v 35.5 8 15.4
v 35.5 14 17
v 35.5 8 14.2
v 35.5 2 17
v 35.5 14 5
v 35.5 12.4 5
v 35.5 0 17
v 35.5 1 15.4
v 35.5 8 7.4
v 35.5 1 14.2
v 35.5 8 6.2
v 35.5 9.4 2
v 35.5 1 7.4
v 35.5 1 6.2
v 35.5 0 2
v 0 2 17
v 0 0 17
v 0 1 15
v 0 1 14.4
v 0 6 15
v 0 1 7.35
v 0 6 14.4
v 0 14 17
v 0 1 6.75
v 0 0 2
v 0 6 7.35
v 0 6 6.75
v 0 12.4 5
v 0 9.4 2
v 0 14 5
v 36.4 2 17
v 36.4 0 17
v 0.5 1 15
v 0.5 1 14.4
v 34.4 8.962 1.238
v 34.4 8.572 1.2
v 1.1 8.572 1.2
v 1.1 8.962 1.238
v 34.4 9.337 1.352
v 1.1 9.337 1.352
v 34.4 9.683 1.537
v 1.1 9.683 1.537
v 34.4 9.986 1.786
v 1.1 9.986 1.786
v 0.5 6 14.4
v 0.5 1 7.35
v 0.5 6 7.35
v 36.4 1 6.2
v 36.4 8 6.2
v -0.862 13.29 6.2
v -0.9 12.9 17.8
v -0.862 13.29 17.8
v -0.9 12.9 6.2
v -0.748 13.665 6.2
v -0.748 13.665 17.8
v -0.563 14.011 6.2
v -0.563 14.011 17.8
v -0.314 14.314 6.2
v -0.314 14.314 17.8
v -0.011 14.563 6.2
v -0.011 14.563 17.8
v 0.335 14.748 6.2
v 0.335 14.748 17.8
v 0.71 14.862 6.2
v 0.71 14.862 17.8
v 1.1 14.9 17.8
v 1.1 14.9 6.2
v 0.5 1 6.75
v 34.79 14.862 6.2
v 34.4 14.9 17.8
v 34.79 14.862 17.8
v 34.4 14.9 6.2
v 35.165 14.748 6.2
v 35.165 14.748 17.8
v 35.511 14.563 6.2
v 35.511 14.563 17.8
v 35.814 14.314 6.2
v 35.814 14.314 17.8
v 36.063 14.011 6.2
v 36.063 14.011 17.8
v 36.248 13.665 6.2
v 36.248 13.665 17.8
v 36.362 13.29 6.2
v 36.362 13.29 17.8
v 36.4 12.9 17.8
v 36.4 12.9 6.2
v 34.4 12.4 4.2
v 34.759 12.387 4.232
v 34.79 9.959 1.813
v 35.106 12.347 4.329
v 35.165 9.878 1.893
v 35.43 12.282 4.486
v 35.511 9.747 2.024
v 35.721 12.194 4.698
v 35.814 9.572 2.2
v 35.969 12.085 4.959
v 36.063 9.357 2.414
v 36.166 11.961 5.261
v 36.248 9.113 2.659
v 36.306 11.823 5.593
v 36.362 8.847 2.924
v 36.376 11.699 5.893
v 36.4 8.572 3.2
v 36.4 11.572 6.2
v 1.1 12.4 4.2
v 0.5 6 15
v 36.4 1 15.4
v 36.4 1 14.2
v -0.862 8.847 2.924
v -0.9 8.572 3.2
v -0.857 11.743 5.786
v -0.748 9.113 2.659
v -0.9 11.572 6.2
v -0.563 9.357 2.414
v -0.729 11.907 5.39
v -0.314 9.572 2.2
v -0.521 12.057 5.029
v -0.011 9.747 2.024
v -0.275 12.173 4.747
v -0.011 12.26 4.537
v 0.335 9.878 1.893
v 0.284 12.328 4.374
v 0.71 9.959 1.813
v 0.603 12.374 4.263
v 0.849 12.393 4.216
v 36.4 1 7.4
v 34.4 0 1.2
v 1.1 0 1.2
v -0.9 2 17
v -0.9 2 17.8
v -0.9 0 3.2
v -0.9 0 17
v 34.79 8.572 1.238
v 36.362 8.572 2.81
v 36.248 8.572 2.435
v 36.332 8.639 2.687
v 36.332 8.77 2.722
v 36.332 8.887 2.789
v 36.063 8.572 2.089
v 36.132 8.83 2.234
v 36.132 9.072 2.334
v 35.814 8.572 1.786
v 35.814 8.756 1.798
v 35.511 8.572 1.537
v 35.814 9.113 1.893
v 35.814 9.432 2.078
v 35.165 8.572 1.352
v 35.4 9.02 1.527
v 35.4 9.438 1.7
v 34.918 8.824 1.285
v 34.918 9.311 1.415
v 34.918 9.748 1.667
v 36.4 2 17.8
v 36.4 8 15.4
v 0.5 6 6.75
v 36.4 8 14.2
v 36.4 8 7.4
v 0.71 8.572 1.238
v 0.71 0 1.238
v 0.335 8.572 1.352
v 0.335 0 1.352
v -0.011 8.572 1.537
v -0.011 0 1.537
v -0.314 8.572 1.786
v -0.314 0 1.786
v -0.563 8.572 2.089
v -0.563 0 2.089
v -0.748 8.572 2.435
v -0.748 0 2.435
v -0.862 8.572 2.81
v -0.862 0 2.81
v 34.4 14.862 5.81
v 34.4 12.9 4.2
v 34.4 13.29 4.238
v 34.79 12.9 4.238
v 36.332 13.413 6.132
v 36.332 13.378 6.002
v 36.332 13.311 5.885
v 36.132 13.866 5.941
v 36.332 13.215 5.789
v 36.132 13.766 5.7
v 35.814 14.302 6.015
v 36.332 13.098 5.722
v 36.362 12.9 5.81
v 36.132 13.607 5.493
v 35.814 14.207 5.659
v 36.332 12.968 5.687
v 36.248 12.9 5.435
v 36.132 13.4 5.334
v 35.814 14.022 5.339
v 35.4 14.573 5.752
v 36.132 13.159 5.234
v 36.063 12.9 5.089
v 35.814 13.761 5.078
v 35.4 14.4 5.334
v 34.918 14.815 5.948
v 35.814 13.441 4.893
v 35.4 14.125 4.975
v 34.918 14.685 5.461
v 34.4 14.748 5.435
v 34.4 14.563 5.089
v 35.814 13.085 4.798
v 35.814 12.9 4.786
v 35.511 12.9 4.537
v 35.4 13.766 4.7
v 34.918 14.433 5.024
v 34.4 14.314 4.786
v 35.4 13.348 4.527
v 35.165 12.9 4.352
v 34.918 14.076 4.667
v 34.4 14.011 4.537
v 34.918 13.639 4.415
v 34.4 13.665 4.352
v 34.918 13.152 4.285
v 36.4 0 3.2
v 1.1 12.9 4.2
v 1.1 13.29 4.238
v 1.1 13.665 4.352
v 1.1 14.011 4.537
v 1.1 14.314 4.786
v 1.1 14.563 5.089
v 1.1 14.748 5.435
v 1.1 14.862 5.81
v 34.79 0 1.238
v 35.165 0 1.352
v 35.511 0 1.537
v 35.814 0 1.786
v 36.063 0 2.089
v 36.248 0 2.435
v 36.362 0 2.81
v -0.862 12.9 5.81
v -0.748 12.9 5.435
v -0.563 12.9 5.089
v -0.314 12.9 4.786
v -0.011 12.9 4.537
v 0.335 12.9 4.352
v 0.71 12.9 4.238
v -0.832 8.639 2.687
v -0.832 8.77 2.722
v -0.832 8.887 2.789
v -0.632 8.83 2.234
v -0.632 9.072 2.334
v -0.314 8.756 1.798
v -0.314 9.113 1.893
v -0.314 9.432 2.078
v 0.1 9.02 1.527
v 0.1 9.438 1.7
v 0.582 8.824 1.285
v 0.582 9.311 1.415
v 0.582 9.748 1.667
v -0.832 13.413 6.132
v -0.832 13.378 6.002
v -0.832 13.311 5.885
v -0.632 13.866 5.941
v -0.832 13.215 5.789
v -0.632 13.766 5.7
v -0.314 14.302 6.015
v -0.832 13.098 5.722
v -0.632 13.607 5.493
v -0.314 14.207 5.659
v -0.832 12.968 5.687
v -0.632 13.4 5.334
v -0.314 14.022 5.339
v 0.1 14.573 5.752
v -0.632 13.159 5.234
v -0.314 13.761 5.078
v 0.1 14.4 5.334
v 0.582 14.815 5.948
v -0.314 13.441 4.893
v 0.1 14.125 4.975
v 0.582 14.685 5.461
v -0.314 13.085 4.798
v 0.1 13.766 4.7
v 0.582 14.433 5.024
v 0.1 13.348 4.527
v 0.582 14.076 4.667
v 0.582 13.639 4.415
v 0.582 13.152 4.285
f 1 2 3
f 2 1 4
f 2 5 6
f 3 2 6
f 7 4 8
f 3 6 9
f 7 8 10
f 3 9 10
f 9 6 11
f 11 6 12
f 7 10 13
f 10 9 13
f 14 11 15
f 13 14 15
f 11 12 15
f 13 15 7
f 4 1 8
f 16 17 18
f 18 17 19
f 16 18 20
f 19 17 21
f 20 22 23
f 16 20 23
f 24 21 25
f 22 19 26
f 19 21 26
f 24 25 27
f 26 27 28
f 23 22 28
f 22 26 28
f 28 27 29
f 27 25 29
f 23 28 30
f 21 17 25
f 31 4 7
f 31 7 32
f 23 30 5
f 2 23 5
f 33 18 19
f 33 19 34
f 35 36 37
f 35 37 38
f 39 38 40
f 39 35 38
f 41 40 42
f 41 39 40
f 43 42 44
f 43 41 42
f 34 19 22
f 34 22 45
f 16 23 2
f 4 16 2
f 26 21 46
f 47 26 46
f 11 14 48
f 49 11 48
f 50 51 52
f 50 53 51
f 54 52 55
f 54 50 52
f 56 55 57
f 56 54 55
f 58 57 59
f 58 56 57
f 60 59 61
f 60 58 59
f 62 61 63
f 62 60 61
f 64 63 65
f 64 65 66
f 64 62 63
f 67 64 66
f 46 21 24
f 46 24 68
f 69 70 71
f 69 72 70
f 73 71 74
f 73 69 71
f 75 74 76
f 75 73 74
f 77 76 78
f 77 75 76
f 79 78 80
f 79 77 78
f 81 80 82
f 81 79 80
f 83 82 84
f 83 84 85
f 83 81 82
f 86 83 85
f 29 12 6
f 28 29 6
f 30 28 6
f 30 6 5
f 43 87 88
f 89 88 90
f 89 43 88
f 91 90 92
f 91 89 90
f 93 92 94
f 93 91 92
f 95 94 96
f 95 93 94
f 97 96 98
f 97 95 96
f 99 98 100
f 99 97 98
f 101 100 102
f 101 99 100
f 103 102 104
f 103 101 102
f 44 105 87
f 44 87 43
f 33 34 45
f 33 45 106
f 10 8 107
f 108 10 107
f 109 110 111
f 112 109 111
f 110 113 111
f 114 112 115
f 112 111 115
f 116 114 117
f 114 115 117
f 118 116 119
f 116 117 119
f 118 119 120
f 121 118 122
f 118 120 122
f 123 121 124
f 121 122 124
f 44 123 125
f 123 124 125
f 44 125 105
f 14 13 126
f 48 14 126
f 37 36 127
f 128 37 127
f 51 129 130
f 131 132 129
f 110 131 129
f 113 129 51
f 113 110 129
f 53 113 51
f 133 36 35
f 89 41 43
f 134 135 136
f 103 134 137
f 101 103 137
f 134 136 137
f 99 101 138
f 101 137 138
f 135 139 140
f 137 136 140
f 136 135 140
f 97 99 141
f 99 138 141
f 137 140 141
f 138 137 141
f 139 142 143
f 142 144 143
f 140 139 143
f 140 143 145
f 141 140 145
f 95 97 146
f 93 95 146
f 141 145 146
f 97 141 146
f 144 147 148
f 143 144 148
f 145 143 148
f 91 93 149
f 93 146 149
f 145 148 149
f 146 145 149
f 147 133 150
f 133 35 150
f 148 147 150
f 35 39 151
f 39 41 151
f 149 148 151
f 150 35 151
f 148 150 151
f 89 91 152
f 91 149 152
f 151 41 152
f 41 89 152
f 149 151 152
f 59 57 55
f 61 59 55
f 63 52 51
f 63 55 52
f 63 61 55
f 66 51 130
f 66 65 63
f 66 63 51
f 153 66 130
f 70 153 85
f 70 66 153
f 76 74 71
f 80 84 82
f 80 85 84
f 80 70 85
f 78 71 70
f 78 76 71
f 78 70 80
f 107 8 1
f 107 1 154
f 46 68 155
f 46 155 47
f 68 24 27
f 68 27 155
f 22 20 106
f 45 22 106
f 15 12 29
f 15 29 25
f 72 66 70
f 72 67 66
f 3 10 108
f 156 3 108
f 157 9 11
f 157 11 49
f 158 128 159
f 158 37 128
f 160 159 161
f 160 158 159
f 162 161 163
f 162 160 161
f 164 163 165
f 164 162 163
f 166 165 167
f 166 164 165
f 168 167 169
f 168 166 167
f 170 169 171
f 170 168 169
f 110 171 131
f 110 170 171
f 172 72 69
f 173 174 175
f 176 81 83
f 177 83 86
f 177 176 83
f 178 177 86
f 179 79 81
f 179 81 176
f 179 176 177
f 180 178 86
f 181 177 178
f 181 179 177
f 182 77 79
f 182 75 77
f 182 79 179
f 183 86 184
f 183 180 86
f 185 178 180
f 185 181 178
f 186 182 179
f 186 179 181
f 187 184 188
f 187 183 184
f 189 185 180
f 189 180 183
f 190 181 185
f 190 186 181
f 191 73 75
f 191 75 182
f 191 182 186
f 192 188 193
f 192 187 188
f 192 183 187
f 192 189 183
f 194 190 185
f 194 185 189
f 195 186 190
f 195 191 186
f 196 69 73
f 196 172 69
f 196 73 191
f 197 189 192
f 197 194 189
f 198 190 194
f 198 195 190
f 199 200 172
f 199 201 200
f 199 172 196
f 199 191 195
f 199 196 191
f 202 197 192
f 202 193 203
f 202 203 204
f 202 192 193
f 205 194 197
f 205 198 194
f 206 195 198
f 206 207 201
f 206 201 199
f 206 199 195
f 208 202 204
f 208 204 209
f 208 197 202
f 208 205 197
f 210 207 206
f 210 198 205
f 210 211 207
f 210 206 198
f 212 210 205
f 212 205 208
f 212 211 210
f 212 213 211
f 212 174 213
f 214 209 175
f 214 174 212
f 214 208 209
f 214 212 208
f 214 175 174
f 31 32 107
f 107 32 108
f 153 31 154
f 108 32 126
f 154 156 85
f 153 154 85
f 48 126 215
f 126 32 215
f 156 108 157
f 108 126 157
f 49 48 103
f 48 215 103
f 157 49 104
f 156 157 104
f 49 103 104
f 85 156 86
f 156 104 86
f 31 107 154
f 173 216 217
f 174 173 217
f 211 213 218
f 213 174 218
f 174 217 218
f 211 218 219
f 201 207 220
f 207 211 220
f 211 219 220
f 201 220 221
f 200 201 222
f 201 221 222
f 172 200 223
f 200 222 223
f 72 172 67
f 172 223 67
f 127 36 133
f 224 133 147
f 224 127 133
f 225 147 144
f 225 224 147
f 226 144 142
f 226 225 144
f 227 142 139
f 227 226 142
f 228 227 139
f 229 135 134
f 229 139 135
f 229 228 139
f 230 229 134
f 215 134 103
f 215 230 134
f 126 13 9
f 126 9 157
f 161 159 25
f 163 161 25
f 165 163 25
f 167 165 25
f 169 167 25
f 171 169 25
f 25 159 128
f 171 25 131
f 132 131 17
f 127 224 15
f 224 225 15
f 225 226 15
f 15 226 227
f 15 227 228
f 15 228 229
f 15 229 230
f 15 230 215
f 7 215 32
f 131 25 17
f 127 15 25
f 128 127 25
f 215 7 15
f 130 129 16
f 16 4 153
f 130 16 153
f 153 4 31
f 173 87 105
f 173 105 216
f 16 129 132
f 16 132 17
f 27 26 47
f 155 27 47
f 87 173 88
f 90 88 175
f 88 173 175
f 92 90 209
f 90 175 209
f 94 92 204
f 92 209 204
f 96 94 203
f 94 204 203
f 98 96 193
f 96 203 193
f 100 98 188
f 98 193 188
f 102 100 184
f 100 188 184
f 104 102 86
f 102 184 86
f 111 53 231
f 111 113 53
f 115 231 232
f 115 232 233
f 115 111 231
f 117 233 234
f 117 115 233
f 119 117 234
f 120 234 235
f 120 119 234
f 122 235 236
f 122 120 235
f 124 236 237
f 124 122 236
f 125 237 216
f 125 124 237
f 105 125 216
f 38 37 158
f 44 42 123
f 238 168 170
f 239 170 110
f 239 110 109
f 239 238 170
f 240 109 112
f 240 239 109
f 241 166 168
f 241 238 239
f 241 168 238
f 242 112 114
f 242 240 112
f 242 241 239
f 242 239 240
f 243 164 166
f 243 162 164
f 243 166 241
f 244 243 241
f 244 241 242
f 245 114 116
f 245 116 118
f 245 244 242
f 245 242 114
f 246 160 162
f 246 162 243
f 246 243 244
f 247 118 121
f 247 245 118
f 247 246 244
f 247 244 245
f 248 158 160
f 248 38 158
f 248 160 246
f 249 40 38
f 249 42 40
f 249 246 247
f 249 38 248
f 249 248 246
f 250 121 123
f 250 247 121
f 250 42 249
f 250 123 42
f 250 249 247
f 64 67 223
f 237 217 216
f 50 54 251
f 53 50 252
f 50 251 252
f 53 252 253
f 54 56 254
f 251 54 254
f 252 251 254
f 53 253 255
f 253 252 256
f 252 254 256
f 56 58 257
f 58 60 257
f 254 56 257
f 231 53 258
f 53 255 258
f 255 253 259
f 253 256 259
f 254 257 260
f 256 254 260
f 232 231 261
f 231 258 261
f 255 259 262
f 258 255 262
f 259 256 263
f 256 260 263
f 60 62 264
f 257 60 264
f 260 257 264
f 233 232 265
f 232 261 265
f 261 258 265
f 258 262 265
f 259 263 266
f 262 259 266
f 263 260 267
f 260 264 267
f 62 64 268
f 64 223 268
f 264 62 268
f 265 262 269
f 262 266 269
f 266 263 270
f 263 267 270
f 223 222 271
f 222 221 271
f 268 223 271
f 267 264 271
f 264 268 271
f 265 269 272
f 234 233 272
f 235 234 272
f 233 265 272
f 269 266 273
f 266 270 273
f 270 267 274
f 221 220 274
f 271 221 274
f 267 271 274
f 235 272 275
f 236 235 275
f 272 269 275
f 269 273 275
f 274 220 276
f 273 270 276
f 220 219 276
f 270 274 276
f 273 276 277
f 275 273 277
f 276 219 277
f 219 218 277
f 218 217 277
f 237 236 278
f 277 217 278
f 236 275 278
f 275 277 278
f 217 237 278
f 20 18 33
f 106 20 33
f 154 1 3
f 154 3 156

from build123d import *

# Parameters (mm, degrees)
F1_DEPTH       = 17
F3_W           = 0.5
F3_H           = 0.6
F4_DEPTH       = 5
F3_W_2         = 1
F3_H_2         = 1.2
F5_DEPTH       = 7
F7_W           = 2.5
F7_H           = 0.8
F8_DEPTH       = 37.3
F6_W           = 37.3
F6_H           = 12.9
F9_DEPTH       = 0.8
F10_W          = 9.4
F10_H          = 0.8
F11_DEPTH      = 36.4
F12_DEPTH      = 25
F12_DEPTH_BACK = 36.401
F13_DEPTH      = 0.901
F14_R          = 2


with BuildPart() as f1:
    # F0 (on Top) → F1 (new body)
    with BuildSketch(Plane.XY):
        Polygon((-0.9, 0), (0, 0), (0, 14), (35.5, 14), (35.5, 0), (36.4, 0), (36.4, 14.9), (-0.9, 14.9), align=None)
    extrude(amount=F1_DEPTH)

    # F3 (on offset) → F4 (join)
    with BuildSketch(Plane.XZ.offset(-1)):
        with Locations((0.25, 14.7)):
            Rectangle(F3_W, F3_H)
        with Locations((0.25, 7.05)):
            Rectangle(F3_W, F3_H)
    extrude(amount=-F4_DEPTH)

    # F3 (on offset) → F5 (cut)
    with BuildSketch(Plane.XZ.offset(-1)):
        with Locations((36, 14.8)):
            Rectangle(F3_W_2, F3_H_2)
        with Locations((36, 6.8)):
            Rectangle(F3_W_2, F3_H_2)
    extrude(amount=-F5_DEPTH, mode=Mode.SUBTRACT)

    # F7 (on face) → F8 (join, through all)
    with BuildSketch(Plane.YZ.offset(36.4)):
        with Locations((13.65, 4.6)):
            Rectangle(F7_W, F7_H)
    extrude(amount=-F8_DEPTH)

    # F6 (on face) → F9 (join)
    with BuildSketch(Plane.XY.offset(17)):
        with Locations((17.75, 8.45)):
            Rectangle(F6_W, F6_H)
    extrude(amount=F9_DEPTH)

    # F10 (on face) → F11 (join, through all)
    with BuildSketch(Plane(origin=(35.5, 0, 0), x_dir=(0, -1, 0), z_dir=(-1, 0, 0))):
        with Locations((-4.7, 1.6)):
            Rectangle(F10_W, F10_H)
        Polygon((-12.4, 4.2), (-9.4, 1.2), (-9.4, 2), (-12.4, 5), align=None)
    extrude(amount=F11_DEPTH)

    # F12 (cut, two sides): a face of the model
    f12_faces = [f1.faces().sort_by_distance(p)[0] for p in [
        (35.5, 7, 0.1461642911),
    ]]
    extrude(f12_faces, amount=-F12_DEPTH, mode=Mode.SUBTRACT)
    extrude(f12_faces, amount=F12_DEPTH_BACK, mode=Mode.SUBTRACT)

    # F13 (cut, through all): a face of the model
    f13_faces = [f1.faces().sort_by_distance(p)[0] for p in [
        (17.75, 14, 2.1),
    ]]
    extrude(f13_faces, amount=-F13_DEPTH, mode=Mode.SUBTRACT)

    # F14
    f14_edges = [f1.edges().sort_by_distance(p)[0] for p in [
        (17.75, 14.9, 4.2),
        (17.75, 9.4, 1.2),
        (-0.9, 4.7, 1.2),
        (36.4, 4.7, 1.2),
        (-0.9, 10.9, 2.7),
        (36.4, 10.9, 2.7),
        (36.4, 14.9, 11),
        (-0.9, 14.9, 11),
        (36.4, 13.65, 4.2),
        (-0.9, 13.65, 4.2),
    ]]
    fillet(f14_edges, radius=F14_R)


solid = f1.part
